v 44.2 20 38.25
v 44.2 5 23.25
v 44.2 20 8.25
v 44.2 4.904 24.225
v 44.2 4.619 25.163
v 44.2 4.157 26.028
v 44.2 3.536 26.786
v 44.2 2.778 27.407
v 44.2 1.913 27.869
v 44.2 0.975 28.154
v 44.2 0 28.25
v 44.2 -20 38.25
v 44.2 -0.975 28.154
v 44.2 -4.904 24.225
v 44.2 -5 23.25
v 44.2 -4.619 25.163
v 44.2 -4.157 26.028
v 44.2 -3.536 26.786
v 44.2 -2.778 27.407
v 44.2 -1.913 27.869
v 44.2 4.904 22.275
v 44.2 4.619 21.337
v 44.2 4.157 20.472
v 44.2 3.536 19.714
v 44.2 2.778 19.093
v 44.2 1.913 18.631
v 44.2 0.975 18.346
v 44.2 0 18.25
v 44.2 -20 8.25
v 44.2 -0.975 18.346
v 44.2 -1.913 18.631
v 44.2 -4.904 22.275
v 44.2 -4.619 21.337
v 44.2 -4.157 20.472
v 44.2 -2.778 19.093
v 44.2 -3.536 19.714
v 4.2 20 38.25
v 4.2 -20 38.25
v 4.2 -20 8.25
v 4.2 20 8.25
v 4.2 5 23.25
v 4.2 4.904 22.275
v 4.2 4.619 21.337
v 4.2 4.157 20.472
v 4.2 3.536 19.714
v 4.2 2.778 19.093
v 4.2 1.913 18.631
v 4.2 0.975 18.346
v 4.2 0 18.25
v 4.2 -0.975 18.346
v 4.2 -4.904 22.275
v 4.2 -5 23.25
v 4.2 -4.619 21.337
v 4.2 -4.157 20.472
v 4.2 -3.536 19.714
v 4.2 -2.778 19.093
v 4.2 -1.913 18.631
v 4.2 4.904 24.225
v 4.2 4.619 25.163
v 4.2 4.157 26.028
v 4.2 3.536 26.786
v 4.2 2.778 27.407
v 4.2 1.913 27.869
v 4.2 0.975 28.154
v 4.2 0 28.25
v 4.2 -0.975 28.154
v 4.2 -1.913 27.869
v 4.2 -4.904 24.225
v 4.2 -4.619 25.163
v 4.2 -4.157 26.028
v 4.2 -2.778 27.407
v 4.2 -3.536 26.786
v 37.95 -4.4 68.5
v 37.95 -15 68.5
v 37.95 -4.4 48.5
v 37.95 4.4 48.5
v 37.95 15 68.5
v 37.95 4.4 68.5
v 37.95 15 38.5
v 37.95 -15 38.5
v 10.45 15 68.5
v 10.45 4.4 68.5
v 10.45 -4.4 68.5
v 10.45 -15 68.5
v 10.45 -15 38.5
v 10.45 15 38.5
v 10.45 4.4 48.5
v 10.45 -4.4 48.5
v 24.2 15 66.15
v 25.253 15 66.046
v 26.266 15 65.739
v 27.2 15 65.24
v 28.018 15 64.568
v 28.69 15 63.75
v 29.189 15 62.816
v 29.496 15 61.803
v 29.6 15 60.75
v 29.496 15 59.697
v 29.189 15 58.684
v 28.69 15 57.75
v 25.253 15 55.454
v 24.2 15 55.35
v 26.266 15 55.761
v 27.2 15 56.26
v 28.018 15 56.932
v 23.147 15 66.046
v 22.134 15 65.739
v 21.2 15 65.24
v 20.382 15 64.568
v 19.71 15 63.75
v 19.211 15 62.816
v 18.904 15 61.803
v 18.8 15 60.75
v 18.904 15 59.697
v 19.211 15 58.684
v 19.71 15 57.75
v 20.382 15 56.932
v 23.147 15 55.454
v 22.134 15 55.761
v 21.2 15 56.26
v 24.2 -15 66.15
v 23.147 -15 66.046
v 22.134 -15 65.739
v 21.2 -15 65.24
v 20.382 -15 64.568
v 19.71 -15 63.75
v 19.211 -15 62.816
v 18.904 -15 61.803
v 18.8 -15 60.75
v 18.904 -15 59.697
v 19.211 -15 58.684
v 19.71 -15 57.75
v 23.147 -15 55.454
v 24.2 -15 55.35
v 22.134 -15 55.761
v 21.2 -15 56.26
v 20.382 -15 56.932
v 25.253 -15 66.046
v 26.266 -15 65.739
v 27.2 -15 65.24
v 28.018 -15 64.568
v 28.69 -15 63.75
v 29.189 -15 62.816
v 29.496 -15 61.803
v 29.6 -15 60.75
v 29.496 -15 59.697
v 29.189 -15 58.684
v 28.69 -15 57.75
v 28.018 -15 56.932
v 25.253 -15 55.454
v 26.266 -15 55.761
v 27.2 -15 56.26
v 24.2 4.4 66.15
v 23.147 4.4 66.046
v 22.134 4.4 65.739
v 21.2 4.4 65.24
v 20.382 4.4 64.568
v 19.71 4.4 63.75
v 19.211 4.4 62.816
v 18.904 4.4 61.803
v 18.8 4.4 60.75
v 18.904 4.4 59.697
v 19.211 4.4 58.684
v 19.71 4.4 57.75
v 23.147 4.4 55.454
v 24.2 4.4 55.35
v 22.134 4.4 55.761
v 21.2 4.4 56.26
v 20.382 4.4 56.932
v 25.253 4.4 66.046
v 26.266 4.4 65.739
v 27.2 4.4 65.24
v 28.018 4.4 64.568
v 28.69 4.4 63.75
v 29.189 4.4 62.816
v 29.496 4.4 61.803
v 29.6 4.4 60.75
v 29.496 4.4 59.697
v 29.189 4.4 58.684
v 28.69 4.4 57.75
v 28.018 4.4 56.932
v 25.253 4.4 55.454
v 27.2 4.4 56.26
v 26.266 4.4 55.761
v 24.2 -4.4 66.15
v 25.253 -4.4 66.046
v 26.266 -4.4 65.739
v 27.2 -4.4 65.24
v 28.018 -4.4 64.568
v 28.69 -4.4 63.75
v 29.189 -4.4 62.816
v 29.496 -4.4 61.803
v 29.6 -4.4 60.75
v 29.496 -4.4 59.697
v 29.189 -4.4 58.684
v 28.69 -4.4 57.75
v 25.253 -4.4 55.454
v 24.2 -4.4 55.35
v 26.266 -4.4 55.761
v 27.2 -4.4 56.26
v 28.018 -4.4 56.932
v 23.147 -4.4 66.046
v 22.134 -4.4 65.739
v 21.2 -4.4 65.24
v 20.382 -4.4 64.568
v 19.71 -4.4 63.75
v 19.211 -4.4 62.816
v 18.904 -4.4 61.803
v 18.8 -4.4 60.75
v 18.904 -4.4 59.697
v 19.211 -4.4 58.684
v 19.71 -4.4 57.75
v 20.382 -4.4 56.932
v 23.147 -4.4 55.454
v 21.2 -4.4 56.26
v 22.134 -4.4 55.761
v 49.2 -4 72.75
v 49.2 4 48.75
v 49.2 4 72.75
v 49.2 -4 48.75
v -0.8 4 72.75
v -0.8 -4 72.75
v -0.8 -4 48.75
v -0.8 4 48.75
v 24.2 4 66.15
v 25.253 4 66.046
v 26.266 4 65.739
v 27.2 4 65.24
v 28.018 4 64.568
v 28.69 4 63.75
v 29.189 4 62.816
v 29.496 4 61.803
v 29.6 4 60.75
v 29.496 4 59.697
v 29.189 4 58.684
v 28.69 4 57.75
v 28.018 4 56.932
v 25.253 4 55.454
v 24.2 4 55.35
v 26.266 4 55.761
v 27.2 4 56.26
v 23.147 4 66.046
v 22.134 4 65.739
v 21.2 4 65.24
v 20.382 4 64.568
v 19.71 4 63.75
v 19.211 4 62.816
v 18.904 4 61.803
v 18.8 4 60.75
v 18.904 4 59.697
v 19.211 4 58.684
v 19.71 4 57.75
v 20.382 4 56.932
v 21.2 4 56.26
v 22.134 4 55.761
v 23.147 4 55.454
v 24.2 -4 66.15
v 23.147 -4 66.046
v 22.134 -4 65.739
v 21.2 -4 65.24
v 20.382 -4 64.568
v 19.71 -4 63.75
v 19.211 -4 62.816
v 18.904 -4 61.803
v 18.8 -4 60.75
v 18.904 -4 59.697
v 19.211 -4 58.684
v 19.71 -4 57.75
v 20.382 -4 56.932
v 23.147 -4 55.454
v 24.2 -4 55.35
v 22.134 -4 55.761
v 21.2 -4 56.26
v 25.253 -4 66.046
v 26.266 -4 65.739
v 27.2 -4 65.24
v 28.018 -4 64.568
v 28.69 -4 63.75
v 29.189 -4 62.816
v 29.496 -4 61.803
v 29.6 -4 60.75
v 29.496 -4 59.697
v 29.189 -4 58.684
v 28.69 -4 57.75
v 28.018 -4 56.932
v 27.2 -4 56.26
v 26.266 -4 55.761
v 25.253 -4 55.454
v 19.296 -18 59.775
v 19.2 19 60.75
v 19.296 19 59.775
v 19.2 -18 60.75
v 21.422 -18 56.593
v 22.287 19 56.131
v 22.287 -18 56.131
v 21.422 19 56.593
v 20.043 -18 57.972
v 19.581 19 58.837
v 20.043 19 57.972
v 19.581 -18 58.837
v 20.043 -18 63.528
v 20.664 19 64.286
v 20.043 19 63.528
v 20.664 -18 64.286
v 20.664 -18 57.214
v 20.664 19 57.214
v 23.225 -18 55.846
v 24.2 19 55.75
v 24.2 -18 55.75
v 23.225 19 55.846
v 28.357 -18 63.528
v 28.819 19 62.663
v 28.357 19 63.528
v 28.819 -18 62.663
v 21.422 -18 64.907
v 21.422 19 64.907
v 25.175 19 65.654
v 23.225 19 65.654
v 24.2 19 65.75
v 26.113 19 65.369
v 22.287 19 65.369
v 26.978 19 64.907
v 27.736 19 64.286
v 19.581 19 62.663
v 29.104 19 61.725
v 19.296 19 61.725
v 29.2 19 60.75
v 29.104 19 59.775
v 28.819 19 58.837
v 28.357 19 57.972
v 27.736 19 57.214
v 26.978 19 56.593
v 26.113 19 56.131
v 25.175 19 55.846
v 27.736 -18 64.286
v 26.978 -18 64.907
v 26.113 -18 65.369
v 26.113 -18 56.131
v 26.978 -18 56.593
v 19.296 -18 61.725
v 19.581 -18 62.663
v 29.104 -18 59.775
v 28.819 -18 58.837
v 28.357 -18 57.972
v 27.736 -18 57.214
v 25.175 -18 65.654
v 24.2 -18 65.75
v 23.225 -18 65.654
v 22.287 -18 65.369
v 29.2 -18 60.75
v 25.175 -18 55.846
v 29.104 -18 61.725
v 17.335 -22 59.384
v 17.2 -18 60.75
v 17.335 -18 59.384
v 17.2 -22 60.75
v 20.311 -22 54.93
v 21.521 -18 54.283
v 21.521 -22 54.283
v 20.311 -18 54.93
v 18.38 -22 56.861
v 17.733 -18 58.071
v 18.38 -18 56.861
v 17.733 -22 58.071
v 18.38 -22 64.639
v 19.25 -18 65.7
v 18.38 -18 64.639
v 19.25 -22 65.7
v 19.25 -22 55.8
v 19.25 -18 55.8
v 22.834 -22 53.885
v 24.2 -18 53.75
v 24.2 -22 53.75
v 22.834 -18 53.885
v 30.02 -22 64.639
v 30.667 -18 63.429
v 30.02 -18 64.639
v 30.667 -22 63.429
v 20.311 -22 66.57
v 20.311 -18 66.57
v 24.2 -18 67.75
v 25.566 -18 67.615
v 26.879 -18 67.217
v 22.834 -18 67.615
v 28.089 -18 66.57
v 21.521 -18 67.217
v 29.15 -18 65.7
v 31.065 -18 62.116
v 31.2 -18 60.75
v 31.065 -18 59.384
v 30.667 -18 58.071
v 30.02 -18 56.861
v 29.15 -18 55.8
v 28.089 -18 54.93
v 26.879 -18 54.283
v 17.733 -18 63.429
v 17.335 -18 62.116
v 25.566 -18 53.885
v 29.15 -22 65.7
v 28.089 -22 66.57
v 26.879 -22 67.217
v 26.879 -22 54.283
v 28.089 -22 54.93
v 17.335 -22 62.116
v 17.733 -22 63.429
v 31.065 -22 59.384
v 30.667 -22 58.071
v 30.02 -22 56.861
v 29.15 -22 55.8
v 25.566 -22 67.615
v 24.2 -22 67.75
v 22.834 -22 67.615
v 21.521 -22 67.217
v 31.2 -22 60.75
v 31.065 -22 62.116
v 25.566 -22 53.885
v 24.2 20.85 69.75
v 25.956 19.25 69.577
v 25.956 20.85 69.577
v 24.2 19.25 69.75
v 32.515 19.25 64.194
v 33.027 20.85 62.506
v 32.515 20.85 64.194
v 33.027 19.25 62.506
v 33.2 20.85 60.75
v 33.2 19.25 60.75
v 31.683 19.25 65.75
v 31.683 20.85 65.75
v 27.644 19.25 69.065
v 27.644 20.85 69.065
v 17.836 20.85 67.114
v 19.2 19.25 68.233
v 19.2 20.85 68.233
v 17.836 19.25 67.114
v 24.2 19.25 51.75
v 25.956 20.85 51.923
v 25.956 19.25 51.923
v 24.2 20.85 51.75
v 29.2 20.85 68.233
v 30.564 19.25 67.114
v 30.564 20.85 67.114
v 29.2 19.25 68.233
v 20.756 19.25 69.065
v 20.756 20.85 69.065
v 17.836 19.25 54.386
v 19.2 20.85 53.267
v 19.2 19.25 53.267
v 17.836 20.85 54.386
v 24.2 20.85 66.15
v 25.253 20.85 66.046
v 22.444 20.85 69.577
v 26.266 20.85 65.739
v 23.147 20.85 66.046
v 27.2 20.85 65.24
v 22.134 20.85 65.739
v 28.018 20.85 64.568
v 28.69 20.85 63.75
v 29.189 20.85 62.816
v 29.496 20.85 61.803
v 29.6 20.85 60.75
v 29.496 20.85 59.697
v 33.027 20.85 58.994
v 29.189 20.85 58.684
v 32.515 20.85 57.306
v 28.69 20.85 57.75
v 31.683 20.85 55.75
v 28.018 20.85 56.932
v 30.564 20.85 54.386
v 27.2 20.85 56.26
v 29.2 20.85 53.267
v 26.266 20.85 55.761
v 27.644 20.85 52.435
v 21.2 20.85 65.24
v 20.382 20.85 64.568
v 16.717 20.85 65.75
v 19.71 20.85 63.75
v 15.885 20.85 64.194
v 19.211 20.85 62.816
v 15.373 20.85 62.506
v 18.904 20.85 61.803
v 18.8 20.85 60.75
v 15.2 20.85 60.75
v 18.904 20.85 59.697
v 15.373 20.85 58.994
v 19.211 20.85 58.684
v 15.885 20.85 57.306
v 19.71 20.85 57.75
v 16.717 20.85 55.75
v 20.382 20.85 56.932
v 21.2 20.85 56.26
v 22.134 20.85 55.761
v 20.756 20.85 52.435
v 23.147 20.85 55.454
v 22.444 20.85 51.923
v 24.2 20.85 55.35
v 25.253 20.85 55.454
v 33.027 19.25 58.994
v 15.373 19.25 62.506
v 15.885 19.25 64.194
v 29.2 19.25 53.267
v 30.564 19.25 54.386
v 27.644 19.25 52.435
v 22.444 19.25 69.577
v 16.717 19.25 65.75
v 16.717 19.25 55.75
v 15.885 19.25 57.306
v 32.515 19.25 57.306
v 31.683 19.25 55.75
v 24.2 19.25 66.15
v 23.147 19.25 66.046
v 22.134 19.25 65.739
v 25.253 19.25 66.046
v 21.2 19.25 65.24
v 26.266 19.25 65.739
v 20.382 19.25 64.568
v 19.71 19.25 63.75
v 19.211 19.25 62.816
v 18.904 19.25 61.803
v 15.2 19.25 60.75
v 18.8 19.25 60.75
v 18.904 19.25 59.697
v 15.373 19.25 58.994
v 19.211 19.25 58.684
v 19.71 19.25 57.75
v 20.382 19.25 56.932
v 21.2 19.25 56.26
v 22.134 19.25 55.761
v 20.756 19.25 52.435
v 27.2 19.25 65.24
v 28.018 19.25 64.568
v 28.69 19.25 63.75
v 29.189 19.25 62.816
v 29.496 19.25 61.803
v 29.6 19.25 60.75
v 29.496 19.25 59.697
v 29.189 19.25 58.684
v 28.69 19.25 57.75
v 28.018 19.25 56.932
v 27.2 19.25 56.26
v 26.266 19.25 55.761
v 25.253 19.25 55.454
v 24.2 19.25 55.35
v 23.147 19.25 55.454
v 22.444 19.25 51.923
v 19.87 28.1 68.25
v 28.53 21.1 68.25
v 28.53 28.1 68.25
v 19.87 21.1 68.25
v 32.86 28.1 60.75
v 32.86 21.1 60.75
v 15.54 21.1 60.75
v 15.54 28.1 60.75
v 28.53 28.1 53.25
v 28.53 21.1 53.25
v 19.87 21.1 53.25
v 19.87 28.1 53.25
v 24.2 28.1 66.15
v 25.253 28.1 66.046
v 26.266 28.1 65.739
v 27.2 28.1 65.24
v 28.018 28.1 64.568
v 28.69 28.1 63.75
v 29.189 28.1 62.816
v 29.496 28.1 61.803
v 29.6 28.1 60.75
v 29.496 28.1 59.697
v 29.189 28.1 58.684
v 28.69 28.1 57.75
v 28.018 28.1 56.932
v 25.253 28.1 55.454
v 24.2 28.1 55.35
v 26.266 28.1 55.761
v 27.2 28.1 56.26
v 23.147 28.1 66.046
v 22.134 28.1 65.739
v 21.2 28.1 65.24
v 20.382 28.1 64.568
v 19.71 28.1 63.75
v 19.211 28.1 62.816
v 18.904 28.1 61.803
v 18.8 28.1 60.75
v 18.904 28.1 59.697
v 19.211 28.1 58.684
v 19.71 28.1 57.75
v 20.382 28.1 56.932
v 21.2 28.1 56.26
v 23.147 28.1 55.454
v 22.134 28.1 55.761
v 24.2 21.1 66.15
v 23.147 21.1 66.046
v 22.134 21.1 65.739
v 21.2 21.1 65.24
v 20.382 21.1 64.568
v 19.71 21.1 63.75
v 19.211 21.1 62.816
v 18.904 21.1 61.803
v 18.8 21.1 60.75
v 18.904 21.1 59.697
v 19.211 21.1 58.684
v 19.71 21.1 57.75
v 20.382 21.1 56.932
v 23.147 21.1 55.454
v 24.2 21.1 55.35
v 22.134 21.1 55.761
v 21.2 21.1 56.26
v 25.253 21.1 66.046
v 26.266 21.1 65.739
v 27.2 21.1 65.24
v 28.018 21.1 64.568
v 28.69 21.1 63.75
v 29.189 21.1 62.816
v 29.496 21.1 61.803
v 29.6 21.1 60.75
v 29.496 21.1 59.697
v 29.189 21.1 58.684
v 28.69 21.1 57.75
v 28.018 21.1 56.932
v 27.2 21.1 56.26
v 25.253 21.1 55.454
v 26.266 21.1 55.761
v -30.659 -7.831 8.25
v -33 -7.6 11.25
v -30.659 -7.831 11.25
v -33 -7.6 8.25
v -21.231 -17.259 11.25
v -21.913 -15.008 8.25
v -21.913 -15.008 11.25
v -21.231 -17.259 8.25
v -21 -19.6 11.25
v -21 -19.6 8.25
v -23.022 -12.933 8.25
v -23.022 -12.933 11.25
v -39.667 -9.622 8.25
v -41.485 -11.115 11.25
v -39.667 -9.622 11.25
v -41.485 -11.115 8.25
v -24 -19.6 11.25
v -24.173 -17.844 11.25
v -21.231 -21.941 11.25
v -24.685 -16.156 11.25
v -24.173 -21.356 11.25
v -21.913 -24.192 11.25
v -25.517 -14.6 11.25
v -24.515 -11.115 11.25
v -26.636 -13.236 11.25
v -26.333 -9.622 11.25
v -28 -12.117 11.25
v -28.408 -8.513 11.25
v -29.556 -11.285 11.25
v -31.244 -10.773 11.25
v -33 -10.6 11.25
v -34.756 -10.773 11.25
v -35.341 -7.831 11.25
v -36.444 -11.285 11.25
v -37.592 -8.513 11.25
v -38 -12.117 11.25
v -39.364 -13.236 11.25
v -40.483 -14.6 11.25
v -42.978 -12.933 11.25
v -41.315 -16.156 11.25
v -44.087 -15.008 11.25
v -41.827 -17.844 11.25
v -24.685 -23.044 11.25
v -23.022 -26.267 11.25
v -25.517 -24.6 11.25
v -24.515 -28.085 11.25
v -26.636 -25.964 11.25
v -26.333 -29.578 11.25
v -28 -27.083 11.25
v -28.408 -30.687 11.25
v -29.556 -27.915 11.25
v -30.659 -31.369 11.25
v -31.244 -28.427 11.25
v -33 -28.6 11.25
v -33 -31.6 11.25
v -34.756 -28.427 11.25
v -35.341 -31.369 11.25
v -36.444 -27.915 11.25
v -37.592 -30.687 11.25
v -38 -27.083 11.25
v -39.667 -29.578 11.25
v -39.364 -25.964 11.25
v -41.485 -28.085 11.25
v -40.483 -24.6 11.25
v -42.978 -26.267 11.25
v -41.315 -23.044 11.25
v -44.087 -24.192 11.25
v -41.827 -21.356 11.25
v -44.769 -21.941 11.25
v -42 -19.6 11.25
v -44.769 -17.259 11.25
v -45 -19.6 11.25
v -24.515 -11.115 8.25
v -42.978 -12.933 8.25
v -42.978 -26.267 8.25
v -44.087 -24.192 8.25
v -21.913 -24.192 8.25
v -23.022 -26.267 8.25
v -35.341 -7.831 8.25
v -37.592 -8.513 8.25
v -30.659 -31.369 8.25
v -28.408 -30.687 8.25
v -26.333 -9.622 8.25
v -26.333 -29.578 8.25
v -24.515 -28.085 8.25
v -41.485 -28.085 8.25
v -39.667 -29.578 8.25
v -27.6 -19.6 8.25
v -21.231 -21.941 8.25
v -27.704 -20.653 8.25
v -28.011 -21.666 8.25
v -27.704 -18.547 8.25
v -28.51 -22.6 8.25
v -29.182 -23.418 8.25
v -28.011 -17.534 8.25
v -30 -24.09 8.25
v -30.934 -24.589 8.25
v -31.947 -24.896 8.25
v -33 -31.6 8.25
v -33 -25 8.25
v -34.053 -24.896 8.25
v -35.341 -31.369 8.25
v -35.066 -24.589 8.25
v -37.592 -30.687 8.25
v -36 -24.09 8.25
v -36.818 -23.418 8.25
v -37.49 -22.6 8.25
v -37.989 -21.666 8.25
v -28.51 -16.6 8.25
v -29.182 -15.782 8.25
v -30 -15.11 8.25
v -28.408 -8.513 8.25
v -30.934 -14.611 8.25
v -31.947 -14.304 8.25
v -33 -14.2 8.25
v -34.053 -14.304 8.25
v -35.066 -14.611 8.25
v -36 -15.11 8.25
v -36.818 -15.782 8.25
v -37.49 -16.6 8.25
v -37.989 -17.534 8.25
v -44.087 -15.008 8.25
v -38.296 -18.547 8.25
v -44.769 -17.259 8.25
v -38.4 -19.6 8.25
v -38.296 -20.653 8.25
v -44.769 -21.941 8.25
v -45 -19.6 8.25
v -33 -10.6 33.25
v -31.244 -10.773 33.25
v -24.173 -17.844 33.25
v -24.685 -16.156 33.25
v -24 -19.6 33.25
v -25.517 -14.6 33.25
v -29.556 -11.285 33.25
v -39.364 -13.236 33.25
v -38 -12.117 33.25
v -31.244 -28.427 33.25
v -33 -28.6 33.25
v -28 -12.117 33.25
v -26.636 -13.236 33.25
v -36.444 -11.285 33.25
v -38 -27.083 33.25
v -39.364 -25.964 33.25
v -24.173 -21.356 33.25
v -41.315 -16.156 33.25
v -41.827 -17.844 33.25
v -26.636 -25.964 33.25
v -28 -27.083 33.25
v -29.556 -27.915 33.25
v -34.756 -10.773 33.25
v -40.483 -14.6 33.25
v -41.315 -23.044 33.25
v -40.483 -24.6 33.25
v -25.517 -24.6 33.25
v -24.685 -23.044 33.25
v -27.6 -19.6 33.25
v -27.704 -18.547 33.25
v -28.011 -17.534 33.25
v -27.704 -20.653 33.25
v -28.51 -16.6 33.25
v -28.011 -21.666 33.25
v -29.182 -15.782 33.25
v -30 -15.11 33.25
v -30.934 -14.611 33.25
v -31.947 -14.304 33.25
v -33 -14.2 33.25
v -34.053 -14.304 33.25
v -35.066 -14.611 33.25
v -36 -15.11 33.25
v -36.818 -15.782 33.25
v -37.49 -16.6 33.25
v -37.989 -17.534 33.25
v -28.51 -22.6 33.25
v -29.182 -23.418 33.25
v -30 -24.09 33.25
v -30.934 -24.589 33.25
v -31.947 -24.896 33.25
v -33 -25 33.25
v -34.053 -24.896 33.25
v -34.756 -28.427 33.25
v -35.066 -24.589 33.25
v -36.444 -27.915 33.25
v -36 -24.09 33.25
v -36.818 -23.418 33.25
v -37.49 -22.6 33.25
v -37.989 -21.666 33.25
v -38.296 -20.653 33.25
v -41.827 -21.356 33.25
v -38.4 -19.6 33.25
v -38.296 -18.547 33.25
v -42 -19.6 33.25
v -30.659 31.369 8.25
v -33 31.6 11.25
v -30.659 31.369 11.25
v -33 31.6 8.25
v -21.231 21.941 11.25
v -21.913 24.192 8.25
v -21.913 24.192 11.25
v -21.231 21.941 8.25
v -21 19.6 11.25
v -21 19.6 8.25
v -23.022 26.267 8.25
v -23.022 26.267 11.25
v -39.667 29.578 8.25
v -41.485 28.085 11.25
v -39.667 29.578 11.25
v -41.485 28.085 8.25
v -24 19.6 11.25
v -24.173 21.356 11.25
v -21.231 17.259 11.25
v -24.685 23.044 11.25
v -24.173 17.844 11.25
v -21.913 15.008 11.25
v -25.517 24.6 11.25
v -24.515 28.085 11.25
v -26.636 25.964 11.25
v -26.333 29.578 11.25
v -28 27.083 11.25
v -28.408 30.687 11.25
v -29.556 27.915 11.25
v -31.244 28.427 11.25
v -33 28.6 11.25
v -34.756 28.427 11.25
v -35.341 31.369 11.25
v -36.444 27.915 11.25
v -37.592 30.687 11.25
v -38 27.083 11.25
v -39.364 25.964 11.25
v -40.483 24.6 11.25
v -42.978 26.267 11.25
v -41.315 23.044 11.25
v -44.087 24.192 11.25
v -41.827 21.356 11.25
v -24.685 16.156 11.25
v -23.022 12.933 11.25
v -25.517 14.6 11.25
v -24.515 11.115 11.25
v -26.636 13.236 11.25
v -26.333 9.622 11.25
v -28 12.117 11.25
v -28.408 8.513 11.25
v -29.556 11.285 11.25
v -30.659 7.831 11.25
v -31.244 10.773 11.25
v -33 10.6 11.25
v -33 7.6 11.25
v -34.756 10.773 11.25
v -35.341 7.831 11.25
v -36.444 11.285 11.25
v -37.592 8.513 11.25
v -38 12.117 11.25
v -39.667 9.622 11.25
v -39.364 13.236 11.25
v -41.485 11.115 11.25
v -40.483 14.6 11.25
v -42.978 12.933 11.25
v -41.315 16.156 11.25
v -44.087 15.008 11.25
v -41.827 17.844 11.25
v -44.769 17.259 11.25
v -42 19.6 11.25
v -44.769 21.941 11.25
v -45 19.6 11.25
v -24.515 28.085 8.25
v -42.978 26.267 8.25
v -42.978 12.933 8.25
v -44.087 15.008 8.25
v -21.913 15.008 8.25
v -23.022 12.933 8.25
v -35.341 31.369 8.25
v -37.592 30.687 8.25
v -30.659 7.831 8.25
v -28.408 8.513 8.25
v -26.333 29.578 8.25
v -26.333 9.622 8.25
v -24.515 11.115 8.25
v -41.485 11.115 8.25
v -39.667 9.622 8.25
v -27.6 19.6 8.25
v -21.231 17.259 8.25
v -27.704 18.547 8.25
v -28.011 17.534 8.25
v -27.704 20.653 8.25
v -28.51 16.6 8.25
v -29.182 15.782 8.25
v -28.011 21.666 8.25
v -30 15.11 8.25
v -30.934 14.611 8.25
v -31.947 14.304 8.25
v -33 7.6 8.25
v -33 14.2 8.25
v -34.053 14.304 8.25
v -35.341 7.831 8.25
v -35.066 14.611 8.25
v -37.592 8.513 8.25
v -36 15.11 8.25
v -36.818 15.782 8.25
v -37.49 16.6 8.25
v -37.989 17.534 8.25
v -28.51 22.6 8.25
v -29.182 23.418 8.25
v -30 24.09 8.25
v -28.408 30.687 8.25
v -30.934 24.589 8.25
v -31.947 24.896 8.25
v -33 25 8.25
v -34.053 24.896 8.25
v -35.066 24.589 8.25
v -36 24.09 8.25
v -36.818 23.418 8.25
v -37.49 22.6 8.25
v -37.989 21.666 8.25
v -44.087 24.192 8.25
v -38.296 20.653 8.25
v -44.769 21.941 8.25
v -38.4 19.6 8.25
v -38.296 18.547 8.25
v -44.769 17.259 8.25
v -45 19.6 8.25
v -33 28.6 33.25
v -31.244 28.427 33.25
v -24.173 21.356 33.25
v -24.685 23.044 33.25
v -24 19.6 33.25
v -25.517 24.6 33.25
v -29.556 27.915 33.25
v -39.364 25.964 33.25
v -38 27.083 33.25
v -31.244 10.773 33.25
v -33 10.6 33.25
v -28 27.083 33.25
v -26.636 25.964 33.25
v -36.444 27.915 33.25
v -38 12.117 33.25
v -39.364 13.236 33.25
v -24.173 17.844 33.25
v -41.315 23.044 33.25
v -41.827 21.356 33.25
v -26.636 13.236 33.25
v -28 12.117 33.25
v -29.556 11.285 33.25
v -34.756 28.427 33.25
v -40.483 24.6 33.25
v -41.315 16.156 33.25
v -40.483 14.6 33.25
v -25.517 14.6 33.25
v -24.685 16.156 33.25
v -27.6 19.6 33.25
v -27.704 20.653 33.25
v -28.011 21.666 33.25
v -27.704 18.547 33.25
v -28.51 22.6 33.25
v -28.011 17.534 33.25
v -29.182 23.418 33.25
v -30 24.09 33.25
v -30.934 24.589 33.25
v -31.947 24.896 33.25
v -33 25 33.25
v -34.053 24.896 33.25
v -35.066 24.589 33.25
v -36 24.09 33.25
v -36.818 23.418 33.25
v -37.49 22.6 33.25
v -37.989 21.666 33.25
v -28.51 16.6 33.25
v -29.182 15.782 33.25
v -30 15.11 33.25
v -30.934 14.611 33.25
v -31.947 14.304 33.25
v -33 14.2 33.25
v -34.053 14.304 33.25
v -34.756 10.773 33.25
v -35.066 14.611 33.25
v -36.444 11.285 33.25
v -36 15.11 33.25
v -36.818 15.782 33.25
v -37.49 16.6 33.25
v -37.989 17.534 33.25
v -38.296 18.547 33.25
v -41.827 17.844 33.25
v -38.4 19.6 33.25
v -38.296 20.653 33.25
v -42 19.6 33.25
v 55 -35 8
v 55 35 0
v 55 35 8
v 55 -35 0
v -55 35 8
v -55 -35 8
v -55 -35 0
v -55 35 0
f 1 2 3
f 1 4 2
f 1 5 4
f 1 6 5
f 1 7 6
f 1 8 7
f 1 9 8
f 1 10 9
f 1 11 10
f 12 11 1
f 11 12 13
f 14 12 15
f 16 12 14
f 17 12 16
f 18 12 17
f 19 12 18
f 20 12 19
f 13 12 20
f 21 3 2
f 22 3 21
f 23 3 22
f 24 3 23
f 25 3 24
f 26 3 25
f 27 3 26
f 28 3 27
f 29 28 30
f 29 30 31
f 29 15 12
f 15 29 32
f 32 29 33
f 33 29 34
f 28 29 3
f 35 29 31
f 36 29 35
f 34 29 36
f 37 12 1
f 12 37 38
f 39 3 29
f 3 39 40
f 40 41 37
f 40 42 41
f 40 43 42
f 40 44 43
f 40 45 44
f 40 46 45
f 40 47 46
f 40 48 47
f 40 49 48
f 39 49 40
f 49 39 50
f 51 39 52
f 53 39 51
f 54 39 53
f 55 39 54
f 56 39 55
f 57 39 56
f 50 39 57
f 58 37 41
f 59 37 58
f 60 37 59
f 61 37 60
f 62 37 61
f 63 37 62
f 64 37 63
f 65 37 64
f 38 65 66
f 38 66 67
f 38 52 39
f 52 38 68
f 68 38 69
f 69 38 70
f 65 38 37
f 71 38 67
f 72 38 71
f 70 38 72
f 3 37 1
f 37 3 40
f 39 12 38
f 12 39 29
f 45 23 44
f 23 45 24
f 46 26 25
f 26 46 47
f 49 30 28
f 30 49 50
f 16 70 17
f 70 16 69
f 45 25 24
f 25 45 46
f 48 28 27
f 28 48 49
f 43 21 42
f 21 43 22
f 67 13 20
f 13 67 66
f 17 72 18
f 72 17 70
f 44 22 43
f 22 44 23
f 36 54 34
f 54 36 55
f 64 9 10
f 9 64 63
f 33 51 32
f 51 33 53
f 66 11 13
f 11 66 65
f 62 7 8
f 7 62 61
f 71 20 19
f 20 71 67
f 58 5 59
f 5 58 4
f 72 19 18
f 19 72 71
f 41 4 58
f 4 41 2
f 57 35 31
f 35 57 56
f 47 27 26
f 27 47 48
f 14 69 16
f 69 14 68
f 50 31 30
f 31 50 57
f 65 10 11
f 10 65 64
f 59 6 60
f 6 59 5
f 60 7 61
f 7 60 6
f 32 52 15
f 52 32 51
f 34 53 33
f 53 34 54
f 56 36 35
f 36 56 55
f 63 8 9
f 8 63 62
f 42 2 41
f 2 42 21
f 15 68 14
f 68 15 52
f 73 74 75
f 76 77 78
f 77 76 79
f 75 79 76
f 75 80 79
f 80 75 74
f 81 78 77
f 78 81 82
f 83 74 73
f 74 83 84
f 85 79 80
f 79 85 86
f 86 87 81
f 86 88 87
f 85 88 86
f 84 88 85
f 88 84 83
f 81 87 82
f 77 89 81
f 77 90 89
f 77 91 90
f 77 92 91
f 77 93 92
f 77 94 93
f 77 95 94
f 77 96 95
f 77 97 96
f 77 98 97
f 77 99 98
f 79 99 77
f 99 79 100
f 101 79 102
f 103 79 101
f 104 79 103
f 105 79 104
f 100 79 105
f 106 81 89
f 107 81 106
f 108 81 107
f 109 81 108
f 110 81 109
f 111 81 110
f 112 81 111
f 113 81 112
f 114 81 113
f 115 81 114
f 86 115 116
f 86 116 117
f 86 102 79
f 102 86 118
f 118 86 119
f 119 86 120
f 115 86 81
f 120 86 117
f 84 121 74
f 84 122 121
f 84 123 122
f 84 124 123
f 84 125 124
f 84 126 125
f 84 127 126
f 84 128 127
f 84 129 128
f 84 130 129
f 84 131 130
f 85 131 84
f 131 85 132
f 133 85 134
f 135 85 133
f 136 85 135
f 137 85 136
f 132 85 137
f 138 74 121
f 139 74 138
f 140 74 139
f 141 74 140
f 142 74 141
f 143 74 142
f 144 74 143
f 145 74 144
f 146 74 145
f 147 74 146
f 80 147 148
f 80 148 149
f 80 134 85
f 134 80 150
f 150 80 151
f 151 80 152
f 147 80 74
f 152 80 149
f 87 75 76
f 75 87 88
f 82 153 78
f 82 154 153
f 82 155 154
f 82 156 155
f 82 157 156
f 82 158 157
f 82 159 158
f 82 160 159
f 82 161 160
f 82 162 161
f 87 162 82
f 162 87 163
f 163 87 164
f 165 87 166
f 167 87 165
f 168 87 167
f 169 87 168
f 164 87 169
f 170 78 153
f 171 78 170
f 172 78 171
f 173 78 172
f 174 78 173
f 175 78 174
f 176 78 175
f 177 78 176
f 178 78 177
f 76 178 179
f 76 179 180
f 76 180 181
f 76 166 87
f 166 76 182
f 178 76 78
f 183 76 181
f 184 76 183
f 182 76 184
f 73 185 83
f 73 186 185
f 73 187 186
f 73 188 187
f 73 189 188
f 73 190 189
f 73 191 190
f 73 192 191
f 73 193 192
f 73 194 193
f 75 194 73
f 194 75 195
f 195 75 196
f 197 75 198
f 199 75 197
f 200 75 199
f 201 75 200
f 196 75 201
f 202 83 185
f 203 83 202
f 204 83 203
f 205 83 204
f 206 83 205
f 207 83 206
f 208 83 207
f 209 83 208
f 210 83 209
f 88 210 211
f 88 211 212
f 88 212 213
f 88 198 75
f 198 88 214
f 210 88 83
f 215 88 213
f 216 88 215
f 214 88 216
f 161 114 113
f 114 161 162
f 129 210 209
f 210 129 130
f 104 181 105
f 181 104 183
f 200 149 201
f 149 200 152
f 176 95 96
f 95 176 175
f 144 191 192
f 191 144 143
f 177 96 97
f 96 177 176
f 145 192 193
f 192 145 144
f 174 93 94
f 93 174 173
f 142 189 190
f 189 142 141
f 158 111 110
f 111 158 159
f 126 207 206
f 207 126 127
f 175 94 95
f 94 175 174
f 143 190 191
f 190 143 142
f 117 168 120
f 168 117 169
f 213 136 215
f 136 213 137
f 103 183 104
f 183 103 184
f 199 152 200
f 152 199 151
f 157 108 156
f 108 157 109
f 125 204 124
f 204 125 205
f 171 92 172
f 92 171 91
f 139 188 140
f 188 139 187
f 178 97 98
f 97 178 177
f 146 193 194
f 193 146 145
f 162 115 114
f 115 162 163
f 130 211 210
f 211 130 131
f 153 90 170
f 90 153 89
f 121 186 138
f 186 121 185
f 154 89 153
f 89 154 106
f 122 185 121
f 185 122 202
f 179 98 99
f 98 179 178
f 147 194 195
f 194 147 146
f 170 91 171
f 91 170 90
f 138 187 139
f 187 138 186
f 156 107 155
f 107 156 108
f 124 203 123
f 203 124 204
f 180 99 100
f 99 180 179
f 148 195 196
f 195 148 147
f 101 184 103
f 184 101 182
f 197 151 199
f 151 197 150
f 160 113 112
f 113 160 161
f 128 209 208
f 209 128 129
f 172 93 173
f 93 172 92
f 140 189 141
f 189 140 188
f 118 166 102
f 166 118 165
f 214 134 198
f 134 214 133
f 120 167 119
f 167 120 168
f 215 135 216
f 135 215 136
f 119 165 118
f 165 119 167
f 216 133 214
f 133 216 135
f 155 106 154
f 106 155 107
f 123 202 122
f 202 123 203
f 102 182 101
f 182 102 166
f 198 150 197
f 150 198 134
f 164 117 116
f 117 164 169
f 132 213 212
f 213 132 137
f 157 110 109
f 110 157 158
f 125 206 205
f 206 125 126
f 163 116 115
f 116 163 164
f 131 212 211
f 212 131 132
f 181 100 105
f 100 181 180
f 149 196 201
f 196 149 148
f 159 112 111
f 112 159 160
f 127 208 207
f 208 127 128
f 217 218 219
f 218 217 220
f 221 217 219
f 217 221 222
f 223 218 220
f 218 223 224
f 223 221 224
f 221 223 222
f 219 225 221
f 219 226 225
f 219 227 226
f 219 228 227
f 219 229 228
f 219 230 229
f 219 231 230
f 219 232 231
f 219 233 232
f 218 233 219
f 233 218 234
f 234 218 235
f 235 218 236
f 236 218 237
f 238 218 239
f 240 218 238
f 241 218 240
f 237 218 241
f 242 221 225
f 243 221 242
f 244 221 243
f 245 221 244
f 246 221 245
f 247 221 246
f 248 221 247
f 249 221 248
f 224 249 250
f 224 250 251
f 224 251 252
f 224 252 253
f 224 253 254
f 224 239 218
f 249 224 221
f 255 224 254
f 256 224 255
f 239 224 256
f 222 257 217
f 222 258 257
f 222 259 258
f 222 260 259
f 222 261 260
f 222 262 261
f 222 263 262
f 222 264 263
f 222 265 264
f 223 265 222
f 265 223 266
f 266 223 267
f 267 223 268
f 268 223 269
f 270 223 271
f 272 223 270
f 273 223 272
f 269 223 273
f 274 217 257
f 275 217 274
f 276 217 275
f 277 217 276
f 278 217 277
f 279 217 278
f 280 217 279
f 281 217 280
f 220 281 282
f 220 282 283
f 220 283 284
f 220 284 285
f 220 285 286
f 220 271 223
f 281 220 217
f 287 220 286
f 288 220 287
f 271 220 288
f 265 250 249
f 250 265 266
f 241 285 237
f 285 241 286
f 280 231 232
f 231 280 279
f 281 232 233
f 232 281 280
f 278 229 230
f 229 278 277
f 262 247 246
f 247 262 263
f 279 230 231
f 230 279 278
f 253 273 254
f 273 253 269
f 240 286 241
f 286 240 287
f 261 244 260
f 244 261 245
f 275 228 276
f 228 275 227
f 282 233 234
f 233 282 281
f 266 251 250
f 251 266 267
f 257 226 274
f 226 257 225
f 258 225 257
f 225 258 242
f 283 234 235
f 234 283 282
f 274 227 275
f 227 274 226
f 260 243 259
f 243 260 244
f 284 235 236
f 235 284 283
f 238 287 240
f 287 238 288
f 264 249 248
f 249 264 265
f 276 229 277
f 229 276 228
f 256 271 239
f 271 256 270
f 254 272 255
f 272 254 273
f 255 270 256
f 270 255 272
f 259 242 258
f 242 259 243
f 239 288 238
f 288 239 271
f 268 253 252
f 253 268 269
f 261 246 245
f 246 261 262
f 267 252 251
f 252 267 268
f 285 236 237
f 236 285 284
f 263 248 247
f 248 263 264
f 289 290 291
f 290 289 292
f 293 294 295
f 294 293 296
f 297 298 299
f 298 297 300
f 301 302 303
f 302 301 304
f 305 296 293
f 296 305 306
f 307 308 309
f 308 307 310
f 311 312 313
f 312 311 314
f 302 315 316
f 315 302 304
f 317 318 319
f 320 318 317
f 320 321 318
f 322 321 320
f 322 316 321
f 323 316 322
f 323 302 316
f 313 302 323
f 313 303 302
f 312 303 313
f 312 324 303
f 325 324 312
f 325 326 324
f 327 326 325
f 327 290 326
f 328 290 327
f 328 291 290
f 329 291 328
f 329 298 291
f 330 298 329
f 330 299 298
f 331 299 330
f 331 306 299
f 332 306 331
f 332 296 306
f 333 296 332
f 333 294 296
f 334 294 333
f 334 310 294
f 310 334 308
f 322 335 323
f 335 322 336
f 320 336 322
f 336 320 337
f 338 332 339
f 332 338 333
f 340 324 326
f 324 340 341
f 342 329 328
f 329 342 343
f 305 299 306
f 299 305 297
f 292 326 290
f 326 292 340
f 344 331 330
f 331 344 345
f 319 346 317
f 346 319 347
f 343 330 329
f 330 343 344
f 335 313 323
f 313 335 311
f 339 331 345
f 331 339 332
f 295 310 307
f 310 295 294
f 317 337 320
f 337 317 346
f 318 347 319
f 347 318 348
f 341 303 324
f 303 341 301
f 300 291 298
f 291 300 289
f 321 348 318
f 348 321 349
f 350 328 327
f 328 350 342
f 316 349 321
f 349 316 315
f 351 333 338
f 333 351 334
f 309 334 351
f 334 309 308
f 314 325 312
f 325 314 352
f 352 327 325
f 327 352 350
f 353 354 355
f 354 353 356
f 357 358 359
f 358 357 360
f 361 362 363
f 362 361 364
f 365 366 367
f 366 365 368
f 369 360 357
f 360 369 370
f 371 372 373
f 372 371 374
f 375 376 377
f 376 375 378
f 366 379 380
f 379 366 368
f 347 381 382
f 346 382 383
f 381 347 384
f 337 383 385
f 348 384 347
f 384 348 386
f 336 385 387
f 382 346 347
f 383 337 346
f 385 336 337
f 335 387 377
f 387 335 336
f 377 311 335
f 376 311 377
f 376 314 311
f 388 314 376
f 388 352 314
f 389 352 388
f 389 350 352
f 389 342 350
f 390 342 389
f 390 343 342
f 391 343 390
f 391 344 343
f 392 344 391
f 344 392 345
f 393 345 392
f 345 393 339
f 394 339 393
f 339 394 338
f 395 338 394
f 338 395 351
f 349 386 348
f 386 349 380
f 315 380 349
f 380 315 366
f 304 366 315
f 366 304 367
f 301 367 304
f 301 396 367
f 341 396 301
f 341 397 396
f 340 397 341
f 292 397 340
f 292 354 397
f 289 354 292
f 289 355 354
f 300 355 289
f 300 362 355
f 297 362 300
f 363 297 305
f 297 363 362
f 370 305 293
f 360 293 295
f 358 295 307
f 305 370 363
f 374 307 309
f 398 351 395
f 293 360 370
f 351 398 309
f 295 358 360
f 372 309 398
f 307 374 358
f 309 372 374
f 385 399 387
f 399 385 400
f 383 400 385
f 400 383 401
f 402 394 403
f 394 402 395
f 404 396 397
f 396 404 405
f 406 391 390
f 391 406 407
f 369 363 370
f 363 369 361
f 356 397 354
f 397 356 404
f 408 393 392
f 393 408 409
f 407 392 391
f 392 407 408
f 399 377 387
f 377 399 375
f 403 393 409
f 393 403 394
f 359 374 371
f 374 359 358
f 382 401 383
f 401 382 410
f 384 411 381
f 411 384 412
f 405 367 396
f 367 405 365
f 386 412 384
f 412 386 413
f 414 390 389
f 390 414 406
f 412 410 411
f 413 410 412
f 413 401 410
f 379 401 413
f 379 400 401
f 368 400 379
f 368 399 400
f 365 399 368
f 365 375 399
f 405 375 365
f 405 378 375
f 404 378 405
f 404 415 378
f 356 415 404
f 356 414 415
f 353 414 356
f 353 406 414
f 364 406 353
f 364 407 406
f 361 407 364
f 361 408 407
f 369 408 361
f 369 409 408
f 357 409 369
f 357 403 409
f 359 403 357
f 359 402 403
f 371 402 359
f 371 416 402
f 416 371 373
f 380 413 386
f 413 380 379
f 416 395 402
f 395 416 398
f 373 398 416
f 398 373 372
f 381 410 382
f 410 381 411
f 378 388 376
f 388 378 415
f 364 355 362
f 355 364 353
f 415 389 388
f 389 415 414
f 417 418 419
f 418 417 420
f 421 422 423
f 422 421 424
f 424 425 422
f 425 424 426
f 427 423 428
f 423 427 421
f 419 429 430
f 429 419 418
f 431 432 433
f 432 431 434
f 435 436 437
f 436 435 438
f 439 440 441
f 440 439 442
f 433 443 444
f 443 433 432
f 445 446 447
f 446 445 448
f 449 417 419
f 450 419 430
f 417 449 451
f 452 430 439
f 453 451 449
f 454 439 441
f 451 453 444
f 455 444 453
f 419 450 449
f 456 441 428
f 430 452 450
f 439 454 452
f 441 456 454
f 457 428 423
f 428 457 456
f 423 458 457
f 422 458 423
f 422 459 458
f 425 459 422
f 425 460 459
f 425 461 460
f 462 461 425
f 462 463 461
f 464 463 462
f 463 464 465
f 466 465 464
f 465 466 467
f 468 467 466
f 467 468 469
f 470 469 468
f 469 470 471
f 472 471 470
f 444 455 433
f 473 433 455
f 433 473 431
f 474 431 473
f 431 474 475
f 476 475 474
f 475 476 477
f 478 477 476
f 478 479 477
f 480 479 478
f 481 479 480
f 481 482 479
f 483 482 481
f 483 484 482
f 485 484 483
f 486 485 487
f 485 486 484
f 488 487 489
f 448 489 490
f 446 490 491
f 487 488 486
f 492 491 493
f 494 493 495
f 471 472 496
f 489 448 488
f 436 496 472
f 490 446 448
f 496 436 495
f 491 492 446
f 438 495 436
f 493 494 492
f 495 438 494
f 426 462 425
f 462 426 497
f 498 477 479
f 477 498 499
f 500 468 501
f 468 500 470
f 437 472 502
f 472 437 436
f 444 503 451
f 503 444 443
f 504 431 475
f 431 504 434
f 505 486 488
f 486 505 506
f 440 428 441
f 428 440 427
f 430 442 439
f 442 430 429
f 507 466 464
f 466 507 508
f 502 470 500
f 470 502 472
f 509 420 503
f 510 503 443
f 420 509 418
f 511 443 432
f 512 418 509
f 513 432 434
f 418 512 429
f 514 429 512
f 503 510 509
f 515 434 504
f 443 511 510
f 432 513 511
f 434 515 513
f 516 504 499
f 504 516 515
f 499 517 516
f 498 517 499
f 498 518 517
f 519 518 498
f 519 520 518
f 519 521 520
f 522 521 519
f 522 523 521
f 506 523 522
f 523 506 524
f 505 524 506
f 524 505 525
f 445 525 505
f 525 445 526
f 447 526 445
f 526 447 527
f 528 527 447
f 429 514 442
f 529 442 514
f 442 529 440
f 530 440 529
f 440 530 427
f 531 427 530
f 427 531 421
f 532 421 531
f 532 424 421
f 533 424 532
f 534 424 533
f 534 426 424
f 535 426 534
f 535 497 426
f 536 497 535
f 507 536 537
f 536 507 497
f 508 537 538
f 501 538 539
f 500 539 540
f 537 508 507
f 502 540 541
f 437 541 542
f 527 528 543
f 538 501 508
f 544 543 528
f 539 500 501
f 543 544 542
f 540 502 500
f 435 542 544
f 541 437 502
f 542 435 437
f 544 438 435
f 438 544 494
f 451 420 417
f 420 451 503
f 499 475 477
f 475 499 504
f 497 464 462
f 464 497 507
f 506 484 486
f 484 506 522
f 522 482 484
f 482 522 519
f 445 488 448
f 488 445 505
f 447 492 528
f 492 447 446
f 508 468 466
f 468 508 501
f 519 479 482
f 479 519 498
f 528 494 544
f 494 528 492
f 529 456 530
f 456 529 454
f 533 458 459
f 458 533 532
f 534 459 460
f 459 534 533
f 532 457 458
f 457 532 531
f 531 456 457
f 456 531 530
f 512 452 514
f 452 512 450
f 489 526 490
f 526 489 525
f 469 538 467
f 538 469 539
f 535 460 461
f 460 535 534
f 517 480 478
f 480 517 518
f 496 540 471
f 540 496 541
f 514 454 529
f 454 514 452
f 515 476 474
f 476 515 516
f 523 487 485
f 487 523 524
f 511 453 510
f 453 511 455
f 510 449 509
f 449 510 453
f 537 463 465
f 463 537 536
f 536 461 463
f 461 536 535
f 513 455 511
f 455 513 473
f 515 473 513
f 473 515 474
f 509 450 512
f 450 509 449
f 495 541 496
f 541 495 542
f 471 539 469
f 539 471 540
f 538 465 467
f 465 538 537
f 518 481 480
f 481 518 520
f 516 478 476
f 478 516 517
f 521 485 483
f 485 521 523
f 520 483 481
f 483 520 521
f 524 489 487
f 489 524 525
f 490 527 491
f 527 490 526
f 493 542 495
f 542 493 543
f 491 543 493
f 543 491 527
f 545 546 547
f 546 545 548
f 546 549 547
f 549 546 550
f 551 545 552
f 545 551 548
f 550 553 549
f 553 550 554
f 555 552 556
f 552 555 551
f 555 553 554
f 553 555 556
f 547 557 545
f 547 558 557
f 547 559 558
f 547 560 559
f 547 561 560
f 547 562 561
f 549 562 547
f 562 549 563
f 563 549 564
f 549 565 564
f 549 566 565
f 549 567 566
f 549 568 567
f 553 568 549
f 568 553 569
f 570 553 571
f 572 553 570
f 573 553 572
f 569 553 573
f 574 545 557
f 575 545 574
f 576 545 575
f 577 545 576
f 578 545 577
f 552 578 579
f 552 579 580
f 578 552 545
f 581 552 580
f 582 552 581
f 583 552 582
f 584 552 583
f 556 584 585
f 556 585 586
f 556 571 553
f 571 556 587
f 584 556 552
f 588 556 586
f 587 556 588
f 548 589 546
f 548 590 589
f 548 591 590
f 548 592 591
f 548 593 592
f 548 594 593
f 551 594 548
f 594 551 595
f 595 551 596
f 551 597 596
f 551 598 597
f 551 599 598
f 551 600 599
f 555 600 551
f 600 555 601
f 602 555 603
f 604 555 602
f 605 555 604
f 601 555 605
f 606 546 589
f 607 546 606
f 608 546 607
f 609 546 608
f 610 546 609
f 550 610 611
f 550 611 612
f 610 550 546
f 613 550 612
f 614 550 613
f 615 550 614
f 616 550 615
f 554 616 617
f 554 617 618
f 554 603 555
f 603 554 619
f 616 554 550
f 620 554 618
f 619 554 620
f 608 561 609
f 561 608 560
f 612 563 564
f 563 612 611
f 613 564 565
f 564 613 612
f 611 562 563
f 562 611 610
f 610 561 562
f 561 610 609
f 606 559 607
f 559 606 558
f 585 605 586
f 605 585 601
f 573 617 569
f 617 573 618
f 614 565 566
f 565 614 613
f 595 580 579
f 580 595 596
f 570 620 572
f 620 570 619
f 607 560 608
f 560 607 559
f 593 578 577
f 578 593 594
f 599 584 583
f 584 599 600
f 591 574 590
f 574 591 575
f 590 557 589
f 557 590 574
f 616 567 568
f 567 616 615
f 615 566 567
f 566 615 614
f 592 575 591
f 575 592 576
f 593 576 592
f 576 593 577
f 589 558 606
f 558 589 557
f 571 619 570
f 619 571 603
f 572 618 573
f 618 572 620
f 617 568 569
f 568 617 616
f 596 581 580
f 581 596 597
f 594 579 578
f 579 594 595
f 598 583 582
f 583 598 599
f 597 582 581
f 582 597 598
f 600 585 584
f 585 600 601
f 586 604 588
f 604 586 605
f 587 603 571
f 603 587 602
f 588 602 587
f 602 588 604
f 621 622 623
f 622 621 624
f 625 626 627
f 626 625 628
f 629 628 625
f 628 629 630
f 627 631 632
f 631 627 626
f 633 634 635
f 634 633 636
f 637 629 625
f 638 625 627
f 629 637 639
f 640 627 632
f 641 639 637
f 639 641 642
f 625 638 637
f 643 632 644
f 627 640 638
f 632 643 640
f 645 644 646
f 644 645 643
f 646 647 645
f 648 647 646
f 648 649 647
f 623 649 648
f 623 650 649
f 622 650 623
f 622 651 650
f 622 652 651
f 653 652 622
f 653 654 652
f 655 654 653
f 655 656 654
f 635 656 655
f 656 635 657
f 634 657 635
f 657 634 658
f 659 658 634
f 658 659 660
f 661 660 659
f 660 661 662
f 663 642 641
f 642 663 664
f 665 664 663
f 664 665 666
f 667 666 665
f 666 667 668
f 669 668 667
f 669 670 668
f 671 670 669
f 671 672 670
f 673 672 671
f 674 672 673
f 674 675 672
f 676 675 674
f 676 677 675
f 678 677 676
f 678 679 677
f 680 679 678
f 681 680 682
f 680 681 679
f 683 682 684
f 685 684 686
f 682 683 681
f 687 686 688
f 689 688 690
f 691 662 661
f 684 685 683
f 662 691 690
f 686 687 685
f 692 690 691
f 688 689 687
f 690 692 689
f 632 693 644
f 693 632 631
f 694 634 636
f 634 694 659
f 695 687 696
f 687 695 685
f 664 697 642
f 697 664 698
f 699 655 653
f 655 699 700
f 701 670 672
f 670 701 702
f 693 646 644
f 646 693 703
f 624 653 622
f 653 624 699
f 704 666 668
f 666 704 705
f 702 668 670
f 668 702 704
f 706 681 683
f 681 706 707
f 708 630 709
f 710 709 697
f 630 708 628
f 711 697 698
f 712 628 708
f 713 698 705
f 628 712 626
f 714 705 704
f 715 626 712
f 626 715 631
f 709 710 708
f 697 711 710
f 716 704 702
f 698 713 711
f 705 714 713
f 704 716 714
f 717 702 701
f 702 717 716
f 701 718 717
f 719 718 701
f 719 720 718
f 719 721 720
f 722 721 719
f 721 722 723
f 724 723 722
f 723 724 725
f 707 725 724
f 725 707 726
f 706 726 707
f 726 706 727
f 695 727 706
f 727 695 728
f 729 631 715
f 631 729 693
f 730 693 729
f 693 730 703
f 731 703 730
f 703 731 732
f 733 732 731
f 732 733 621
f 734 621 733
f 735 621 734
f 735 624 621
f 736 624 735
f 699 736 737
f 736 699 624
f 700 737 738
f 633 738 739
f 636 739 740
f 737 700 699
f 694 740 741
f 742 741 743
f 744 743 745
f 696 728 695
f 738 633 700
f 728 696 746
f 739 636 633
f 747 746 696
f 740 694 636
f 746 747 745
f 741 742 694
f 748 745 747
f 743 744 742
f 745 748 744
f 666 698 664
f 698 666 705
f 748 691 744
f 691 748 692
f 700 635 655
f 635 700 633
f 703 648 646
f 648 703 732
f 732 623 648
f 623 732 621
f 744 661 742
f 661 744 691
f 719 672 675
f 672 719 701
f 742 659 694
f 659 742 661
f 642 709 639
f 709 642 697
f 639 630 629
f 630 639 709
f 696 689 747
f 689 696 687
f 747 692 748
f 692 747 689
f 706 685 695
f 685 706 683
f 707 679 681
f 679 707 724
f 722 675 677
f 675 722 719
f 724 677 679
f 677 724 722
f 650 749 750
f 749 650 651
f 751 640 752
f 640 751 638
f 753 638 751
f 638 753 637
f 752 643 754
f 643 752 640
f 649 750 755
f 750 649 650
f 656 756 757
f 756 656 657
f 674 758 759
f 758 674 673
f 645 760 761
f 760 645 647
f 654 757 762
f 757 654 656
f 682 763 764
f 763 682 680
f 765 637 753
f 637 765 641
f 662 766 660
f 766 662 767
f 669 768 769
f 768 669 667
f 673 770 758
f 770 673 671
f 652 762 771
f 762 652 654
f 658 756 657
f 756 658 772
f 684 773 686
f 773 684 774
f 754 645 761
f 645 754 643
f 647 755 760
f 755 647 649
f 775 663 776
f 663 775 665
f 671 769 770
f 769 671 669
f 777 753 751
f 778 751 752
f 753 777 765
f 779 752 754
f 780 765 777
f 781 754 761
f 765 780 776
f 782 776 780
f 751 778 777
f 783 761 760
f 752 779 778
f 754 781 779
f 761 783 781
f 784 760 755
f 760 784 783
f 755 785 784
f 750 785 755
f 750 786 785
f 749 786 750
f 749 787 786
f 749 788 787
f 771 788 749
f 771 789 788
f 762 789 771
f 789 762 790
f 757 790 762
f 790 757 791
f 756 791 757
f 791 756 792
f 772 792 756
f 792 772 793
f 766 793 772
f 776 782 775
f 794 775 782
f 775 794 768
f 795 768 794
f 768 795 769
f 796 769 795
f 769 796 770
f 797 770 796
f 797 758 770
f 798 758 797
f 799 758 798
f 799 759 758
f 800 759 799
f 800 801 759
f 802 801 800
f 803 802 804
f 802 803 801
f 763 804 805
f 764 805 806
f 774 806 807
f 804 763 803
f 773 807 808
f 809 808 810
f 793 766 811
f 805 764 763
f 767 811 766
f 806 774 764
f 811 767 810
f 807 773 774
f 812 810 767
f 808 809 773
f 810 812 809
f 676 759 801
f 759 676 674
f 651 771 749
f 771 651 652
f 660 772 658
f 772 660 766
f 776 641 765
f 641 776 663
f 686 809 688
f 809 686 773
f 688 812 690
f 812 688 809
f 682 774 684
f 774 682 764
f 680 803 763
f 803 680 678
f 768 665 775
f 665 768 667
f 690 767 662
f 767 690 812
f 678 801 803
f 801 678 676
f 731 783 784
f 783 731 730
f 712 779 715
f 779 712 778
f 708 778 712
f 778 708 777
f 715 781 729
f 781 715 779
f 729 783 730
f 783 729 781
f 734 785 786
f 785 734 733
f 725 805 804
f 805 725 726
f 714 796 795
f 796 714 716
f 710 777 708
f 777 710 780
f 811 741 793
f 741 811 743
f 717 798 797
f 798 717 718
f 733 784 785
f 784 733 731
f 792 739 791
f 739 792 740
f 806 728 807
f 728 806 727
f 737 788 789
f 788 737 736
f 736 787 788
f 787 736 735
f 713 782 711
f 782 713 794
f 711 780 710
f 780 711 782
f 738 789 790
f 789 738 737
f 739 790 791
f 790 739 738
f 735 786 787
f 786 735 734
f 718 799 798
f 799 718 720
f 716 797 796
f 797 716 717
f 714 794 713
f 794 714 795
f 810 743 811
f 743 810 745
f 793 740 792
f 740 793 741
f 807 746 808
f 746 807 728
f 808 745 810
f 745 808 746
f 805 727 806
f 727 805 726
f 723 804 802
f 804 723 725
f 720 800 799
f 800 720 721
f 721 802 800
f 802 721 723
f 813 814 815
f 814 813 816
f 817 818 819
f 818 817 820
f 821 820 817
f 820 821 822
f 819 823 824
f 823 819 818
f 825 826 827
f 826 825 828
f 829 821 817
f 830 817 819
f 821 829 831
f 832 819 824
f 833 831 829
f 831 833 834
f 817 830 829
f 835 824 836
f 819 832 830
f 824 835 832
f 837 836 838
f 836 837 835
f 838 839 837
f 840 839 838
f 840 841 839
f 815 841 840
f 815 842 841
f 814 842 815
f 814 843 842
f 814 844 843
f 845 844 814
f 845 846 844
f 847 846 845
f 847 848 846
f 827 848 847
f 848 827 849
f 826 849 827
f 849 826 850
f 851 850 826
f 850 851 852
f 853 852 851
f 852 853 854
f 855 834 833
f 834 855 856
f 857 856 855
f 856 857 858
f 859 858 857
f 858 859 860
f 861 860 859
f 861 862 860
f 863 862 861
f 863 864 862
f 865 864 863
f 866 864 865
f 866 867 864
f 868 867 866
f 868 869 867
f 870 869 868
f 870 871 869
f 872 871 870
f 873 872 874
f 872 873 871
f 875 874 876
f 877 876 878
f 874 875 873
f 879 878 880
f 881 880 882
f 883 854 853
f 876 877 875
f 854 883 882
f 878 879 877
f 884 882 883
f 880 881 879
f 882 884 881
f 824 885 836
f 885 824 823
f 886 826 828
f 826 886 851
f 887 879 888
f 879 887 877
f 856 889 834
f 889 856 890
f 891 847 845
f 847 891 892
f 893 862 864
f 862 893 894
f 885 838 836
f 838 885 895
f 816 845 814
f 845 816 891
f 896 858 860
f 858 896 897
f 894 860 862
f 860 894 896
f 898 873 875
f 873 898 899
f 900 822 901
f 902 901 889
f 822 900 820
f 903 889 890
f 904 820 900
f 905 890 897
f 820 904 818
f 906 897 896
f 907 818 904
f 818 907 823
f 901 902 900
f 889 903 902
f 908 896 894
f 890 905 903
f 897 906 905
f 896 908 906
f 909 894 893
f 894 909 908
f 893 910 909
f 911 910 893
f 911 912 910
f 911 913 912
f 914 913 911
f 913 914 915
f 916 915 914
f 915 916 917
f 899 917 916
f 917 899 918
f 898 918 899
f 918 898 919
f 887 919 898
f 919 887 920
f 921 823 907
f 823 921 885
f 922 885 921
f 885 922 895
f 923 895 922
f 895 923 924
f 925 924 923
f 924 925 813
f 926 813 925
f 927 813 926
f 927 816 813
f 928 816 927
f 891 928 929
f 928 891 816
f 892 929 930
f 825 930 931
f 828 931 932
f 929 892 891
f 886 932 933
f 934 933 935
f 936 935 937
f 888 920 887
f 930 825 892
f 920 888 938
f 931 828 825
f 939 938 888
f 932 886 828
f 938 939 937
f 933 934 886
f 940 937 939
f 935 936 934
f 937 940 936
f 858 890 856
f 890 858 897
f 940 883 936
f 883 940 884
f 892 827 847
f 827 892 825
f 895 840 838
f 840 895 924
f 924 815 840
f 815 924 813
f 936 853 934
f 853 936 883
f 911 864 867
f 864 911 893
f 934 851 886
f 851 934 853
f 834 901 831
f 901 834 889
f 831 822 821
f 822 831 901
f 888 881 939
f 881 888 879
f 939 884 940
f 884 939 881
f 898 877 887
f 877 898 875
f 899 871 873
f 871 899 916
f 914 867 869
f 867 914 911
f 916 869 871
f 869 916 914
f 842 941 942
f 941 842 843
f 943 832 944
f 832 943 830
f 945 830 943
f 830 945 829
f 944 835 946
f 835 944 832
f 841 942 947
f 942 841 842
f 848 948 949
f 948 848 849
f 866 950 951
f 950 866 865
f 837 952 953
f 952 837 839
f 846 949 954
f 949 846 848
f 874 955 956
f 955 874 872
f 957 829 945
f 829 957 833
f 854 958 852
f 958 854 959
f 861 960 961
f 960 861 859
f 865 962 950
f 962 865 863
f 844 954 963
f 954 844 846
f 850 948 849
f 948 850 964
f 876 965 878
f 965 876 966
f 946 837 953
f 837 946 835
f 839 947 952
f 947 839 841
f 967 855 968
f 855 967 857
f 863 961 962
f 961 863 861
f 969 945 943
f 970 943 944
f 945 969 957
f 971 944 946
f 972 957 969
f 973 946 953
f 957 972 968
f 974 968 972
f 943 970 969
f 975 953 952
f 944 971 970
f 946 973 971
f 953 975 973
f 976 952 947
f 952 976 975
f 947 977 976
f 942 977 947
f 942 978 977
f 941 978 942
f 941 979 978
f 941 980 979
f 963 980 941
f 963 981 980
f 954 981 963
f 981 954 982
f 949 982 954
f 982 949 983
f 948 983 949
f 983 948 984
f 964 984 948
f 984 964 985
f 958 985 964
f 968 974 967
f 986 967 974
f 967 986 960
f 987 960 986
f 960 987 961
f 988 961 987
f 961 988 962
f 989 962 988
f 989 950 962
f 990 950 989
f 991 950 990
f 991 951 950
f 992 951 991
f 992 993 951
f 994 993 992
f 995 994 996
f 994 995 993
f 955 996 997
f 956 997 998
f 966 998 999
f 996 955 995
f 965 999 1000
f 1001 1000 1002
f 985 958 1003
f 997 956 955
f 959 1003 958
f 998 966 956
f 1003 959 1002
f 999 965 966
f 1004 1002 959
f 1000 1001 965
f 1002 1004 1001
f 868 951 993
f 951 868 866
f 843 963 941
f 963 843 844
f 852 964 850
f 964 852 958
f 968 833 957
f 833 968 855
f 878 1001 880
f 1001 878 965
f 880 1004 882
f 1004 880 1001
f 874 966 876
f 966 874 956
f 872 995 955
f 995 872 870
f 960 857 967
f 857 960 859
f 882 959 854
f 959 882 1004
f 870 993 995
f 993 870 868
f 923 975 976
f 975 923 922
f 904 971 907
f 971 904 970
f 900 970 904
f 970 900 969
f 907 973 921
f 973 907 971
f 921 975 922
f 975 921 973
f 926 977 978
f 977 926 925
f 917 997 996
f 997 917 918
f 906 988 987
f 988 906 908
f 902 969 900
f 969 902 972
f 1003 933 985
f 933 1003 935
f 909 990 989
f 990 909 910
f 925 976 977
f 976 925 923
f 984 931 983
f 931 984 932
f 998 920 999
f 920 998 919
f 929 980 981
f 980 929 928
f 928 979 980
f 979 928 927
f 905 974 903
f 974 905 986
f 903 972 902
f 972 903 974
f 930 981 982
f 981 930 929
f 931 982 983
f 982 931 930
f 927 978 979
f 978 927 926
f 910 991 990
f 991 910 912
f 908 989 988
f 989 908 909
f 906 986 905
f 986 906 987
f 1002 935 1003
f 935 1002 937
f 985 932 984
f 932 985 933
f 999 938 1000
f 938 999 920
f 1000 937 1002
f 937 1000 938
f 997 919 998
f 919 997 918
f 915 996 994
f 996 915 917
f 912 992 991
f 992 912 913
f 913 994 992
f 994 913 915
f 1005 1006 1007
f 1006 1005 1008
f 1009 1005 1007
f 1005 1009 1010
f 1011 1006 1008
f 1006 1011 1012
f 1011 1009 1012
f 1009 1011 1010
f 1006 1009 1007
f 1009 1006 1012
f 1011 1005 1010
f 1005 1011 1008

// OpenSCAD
$fn = 32;

// ------------------------------------------------------------------------
// Indexing jig: plate 110 x 70 mm, pin d10
// Every part is its own module, assembly() places every instance.
// ------------------------------------------------------------------------

// --- part 1 ---
module jig_plate() {
  difference() {
    translate([-55, -35, 0]) cube([110, 70, 8]);
  }
}

// --- part 2 ---
module locator_block() {
  difference() {
    translate([-20, -20, 0]) cube([40, 40, 30]);
    translate([0, 0, 15]) rotate([0, 90, 0]) cylinder(h = 42, d = 10, center = true);
  }
}

// --- part 3 ---
module index_fork() {
  difference() {
    translate([-13.75, -15, 0]) cube([27.5, 30, 30]);
    translate([-14.75, -4.4, 10]) cube([29.5, 8.8, 21]);
    translate([0, 0, 22.25]) rotate([90, 0, 0]) cylinder(h = 32, d = 10.8, center = true);
  }
}

// --- part 4 ---
module index_arm() {
  difference() {
    translate([-25, -4, 0]) cube([50, 8, 24]);
    translate([0, 0, 12]) rotate([90, 0, 0]) cylinder(h = 10, d = 10.8, center = true);
  }
}

// --- part 5 ---
module index_pin() {
  rotate([0, 90, 0]) cylinder(h = 38, d = 10, center = true);
  translate([-22, 0, 0]) rotate([0, 90, 0]) cylinder(h = 4, d = 14);
}

// --- part 6 ---
module pin_washer() {
  difference() {
      translate([0, 0, 0]) cylinder(h = 1.6, d = 18);
      translate([0, 0, -1]) cylinder(h = 3.6, d = 10.8);
    }
}

// --- part 7 ---
module lock_nut() {
  difference() {
    linear_extrude(height = 7) polygon(points = [[8.66, 0], [4.33, 7.5], [-4.33, 7.5], [-8.66, 0], [-4.33, -7.5], [4.33, -7.5]]);
    translate([0, 0, -1]) cylinder(h = 9, d = 10.8);
  }
}

// --- part 8 ---
module guide_bush_a() {
  difference() {
    union() {
      cylinder(h = 3, d = 24);
      translate([0, 0, 3]) cylinder(h = 22, d = 18);
    }
    translate([0, 0, -1]) cylinder(h = 27, d = 10.8);
  }
}

// --- part 9 ---
module guide_bush_b() {
  difference() {
    union() {
      cylinder(h = 3, d = 24);
      translate([0, 0, 3]) cylinder(h = 22, d = 18);
    }
    translate([0, 0, -1]) cylinder(h = 27, d = 10.8);
  }
}

// --- assembly ---
module assembly() {
  color([0.80, 0.24, 0.20]) translate([0, 0, 0]) rotate([0, 0, 0]) jig_plate();
  color([0.20, 0.45, 0.75]) translate([24.2, 0, 8.25]) rotate([0, 0, 0]) locator_block();
  color([0.25, 0.62, 0.32]) translate([24.2, 0, 38.5]) rotate([0, 0, 0]) index_fork();
  color([0.92, 0.70, 0.18]) translate([24.2, 0, 48.75]) rotate([0, 0, 0]) index_arm();
  color([0.58, 0.35, 0.70]) translate([24.2, 0, 60.75]) rotate([0, 0, 90]) index_pin();
  color([0.16, 0.66, 0.66]) translate([24.2, 20.85, 60.75]) rotate([90, 0, 0]) pin_washer();
  color([0.85, 0.48, 0.18]) translate([24.2, 28.1, 60.75]) rotate([90, 0, 0]) lock_nut();
  color([0.55, 0.60, 0.65]) translate([-33, -19.6, 8.25]) rotate([0, 0, 0]) guide_bush_a();
  color([0.75, 0.30, 0.55]) translate([-33, 19.6, 8.25]) rotate([0, 0, 0]) guide_bush_b();
}

assembly();
